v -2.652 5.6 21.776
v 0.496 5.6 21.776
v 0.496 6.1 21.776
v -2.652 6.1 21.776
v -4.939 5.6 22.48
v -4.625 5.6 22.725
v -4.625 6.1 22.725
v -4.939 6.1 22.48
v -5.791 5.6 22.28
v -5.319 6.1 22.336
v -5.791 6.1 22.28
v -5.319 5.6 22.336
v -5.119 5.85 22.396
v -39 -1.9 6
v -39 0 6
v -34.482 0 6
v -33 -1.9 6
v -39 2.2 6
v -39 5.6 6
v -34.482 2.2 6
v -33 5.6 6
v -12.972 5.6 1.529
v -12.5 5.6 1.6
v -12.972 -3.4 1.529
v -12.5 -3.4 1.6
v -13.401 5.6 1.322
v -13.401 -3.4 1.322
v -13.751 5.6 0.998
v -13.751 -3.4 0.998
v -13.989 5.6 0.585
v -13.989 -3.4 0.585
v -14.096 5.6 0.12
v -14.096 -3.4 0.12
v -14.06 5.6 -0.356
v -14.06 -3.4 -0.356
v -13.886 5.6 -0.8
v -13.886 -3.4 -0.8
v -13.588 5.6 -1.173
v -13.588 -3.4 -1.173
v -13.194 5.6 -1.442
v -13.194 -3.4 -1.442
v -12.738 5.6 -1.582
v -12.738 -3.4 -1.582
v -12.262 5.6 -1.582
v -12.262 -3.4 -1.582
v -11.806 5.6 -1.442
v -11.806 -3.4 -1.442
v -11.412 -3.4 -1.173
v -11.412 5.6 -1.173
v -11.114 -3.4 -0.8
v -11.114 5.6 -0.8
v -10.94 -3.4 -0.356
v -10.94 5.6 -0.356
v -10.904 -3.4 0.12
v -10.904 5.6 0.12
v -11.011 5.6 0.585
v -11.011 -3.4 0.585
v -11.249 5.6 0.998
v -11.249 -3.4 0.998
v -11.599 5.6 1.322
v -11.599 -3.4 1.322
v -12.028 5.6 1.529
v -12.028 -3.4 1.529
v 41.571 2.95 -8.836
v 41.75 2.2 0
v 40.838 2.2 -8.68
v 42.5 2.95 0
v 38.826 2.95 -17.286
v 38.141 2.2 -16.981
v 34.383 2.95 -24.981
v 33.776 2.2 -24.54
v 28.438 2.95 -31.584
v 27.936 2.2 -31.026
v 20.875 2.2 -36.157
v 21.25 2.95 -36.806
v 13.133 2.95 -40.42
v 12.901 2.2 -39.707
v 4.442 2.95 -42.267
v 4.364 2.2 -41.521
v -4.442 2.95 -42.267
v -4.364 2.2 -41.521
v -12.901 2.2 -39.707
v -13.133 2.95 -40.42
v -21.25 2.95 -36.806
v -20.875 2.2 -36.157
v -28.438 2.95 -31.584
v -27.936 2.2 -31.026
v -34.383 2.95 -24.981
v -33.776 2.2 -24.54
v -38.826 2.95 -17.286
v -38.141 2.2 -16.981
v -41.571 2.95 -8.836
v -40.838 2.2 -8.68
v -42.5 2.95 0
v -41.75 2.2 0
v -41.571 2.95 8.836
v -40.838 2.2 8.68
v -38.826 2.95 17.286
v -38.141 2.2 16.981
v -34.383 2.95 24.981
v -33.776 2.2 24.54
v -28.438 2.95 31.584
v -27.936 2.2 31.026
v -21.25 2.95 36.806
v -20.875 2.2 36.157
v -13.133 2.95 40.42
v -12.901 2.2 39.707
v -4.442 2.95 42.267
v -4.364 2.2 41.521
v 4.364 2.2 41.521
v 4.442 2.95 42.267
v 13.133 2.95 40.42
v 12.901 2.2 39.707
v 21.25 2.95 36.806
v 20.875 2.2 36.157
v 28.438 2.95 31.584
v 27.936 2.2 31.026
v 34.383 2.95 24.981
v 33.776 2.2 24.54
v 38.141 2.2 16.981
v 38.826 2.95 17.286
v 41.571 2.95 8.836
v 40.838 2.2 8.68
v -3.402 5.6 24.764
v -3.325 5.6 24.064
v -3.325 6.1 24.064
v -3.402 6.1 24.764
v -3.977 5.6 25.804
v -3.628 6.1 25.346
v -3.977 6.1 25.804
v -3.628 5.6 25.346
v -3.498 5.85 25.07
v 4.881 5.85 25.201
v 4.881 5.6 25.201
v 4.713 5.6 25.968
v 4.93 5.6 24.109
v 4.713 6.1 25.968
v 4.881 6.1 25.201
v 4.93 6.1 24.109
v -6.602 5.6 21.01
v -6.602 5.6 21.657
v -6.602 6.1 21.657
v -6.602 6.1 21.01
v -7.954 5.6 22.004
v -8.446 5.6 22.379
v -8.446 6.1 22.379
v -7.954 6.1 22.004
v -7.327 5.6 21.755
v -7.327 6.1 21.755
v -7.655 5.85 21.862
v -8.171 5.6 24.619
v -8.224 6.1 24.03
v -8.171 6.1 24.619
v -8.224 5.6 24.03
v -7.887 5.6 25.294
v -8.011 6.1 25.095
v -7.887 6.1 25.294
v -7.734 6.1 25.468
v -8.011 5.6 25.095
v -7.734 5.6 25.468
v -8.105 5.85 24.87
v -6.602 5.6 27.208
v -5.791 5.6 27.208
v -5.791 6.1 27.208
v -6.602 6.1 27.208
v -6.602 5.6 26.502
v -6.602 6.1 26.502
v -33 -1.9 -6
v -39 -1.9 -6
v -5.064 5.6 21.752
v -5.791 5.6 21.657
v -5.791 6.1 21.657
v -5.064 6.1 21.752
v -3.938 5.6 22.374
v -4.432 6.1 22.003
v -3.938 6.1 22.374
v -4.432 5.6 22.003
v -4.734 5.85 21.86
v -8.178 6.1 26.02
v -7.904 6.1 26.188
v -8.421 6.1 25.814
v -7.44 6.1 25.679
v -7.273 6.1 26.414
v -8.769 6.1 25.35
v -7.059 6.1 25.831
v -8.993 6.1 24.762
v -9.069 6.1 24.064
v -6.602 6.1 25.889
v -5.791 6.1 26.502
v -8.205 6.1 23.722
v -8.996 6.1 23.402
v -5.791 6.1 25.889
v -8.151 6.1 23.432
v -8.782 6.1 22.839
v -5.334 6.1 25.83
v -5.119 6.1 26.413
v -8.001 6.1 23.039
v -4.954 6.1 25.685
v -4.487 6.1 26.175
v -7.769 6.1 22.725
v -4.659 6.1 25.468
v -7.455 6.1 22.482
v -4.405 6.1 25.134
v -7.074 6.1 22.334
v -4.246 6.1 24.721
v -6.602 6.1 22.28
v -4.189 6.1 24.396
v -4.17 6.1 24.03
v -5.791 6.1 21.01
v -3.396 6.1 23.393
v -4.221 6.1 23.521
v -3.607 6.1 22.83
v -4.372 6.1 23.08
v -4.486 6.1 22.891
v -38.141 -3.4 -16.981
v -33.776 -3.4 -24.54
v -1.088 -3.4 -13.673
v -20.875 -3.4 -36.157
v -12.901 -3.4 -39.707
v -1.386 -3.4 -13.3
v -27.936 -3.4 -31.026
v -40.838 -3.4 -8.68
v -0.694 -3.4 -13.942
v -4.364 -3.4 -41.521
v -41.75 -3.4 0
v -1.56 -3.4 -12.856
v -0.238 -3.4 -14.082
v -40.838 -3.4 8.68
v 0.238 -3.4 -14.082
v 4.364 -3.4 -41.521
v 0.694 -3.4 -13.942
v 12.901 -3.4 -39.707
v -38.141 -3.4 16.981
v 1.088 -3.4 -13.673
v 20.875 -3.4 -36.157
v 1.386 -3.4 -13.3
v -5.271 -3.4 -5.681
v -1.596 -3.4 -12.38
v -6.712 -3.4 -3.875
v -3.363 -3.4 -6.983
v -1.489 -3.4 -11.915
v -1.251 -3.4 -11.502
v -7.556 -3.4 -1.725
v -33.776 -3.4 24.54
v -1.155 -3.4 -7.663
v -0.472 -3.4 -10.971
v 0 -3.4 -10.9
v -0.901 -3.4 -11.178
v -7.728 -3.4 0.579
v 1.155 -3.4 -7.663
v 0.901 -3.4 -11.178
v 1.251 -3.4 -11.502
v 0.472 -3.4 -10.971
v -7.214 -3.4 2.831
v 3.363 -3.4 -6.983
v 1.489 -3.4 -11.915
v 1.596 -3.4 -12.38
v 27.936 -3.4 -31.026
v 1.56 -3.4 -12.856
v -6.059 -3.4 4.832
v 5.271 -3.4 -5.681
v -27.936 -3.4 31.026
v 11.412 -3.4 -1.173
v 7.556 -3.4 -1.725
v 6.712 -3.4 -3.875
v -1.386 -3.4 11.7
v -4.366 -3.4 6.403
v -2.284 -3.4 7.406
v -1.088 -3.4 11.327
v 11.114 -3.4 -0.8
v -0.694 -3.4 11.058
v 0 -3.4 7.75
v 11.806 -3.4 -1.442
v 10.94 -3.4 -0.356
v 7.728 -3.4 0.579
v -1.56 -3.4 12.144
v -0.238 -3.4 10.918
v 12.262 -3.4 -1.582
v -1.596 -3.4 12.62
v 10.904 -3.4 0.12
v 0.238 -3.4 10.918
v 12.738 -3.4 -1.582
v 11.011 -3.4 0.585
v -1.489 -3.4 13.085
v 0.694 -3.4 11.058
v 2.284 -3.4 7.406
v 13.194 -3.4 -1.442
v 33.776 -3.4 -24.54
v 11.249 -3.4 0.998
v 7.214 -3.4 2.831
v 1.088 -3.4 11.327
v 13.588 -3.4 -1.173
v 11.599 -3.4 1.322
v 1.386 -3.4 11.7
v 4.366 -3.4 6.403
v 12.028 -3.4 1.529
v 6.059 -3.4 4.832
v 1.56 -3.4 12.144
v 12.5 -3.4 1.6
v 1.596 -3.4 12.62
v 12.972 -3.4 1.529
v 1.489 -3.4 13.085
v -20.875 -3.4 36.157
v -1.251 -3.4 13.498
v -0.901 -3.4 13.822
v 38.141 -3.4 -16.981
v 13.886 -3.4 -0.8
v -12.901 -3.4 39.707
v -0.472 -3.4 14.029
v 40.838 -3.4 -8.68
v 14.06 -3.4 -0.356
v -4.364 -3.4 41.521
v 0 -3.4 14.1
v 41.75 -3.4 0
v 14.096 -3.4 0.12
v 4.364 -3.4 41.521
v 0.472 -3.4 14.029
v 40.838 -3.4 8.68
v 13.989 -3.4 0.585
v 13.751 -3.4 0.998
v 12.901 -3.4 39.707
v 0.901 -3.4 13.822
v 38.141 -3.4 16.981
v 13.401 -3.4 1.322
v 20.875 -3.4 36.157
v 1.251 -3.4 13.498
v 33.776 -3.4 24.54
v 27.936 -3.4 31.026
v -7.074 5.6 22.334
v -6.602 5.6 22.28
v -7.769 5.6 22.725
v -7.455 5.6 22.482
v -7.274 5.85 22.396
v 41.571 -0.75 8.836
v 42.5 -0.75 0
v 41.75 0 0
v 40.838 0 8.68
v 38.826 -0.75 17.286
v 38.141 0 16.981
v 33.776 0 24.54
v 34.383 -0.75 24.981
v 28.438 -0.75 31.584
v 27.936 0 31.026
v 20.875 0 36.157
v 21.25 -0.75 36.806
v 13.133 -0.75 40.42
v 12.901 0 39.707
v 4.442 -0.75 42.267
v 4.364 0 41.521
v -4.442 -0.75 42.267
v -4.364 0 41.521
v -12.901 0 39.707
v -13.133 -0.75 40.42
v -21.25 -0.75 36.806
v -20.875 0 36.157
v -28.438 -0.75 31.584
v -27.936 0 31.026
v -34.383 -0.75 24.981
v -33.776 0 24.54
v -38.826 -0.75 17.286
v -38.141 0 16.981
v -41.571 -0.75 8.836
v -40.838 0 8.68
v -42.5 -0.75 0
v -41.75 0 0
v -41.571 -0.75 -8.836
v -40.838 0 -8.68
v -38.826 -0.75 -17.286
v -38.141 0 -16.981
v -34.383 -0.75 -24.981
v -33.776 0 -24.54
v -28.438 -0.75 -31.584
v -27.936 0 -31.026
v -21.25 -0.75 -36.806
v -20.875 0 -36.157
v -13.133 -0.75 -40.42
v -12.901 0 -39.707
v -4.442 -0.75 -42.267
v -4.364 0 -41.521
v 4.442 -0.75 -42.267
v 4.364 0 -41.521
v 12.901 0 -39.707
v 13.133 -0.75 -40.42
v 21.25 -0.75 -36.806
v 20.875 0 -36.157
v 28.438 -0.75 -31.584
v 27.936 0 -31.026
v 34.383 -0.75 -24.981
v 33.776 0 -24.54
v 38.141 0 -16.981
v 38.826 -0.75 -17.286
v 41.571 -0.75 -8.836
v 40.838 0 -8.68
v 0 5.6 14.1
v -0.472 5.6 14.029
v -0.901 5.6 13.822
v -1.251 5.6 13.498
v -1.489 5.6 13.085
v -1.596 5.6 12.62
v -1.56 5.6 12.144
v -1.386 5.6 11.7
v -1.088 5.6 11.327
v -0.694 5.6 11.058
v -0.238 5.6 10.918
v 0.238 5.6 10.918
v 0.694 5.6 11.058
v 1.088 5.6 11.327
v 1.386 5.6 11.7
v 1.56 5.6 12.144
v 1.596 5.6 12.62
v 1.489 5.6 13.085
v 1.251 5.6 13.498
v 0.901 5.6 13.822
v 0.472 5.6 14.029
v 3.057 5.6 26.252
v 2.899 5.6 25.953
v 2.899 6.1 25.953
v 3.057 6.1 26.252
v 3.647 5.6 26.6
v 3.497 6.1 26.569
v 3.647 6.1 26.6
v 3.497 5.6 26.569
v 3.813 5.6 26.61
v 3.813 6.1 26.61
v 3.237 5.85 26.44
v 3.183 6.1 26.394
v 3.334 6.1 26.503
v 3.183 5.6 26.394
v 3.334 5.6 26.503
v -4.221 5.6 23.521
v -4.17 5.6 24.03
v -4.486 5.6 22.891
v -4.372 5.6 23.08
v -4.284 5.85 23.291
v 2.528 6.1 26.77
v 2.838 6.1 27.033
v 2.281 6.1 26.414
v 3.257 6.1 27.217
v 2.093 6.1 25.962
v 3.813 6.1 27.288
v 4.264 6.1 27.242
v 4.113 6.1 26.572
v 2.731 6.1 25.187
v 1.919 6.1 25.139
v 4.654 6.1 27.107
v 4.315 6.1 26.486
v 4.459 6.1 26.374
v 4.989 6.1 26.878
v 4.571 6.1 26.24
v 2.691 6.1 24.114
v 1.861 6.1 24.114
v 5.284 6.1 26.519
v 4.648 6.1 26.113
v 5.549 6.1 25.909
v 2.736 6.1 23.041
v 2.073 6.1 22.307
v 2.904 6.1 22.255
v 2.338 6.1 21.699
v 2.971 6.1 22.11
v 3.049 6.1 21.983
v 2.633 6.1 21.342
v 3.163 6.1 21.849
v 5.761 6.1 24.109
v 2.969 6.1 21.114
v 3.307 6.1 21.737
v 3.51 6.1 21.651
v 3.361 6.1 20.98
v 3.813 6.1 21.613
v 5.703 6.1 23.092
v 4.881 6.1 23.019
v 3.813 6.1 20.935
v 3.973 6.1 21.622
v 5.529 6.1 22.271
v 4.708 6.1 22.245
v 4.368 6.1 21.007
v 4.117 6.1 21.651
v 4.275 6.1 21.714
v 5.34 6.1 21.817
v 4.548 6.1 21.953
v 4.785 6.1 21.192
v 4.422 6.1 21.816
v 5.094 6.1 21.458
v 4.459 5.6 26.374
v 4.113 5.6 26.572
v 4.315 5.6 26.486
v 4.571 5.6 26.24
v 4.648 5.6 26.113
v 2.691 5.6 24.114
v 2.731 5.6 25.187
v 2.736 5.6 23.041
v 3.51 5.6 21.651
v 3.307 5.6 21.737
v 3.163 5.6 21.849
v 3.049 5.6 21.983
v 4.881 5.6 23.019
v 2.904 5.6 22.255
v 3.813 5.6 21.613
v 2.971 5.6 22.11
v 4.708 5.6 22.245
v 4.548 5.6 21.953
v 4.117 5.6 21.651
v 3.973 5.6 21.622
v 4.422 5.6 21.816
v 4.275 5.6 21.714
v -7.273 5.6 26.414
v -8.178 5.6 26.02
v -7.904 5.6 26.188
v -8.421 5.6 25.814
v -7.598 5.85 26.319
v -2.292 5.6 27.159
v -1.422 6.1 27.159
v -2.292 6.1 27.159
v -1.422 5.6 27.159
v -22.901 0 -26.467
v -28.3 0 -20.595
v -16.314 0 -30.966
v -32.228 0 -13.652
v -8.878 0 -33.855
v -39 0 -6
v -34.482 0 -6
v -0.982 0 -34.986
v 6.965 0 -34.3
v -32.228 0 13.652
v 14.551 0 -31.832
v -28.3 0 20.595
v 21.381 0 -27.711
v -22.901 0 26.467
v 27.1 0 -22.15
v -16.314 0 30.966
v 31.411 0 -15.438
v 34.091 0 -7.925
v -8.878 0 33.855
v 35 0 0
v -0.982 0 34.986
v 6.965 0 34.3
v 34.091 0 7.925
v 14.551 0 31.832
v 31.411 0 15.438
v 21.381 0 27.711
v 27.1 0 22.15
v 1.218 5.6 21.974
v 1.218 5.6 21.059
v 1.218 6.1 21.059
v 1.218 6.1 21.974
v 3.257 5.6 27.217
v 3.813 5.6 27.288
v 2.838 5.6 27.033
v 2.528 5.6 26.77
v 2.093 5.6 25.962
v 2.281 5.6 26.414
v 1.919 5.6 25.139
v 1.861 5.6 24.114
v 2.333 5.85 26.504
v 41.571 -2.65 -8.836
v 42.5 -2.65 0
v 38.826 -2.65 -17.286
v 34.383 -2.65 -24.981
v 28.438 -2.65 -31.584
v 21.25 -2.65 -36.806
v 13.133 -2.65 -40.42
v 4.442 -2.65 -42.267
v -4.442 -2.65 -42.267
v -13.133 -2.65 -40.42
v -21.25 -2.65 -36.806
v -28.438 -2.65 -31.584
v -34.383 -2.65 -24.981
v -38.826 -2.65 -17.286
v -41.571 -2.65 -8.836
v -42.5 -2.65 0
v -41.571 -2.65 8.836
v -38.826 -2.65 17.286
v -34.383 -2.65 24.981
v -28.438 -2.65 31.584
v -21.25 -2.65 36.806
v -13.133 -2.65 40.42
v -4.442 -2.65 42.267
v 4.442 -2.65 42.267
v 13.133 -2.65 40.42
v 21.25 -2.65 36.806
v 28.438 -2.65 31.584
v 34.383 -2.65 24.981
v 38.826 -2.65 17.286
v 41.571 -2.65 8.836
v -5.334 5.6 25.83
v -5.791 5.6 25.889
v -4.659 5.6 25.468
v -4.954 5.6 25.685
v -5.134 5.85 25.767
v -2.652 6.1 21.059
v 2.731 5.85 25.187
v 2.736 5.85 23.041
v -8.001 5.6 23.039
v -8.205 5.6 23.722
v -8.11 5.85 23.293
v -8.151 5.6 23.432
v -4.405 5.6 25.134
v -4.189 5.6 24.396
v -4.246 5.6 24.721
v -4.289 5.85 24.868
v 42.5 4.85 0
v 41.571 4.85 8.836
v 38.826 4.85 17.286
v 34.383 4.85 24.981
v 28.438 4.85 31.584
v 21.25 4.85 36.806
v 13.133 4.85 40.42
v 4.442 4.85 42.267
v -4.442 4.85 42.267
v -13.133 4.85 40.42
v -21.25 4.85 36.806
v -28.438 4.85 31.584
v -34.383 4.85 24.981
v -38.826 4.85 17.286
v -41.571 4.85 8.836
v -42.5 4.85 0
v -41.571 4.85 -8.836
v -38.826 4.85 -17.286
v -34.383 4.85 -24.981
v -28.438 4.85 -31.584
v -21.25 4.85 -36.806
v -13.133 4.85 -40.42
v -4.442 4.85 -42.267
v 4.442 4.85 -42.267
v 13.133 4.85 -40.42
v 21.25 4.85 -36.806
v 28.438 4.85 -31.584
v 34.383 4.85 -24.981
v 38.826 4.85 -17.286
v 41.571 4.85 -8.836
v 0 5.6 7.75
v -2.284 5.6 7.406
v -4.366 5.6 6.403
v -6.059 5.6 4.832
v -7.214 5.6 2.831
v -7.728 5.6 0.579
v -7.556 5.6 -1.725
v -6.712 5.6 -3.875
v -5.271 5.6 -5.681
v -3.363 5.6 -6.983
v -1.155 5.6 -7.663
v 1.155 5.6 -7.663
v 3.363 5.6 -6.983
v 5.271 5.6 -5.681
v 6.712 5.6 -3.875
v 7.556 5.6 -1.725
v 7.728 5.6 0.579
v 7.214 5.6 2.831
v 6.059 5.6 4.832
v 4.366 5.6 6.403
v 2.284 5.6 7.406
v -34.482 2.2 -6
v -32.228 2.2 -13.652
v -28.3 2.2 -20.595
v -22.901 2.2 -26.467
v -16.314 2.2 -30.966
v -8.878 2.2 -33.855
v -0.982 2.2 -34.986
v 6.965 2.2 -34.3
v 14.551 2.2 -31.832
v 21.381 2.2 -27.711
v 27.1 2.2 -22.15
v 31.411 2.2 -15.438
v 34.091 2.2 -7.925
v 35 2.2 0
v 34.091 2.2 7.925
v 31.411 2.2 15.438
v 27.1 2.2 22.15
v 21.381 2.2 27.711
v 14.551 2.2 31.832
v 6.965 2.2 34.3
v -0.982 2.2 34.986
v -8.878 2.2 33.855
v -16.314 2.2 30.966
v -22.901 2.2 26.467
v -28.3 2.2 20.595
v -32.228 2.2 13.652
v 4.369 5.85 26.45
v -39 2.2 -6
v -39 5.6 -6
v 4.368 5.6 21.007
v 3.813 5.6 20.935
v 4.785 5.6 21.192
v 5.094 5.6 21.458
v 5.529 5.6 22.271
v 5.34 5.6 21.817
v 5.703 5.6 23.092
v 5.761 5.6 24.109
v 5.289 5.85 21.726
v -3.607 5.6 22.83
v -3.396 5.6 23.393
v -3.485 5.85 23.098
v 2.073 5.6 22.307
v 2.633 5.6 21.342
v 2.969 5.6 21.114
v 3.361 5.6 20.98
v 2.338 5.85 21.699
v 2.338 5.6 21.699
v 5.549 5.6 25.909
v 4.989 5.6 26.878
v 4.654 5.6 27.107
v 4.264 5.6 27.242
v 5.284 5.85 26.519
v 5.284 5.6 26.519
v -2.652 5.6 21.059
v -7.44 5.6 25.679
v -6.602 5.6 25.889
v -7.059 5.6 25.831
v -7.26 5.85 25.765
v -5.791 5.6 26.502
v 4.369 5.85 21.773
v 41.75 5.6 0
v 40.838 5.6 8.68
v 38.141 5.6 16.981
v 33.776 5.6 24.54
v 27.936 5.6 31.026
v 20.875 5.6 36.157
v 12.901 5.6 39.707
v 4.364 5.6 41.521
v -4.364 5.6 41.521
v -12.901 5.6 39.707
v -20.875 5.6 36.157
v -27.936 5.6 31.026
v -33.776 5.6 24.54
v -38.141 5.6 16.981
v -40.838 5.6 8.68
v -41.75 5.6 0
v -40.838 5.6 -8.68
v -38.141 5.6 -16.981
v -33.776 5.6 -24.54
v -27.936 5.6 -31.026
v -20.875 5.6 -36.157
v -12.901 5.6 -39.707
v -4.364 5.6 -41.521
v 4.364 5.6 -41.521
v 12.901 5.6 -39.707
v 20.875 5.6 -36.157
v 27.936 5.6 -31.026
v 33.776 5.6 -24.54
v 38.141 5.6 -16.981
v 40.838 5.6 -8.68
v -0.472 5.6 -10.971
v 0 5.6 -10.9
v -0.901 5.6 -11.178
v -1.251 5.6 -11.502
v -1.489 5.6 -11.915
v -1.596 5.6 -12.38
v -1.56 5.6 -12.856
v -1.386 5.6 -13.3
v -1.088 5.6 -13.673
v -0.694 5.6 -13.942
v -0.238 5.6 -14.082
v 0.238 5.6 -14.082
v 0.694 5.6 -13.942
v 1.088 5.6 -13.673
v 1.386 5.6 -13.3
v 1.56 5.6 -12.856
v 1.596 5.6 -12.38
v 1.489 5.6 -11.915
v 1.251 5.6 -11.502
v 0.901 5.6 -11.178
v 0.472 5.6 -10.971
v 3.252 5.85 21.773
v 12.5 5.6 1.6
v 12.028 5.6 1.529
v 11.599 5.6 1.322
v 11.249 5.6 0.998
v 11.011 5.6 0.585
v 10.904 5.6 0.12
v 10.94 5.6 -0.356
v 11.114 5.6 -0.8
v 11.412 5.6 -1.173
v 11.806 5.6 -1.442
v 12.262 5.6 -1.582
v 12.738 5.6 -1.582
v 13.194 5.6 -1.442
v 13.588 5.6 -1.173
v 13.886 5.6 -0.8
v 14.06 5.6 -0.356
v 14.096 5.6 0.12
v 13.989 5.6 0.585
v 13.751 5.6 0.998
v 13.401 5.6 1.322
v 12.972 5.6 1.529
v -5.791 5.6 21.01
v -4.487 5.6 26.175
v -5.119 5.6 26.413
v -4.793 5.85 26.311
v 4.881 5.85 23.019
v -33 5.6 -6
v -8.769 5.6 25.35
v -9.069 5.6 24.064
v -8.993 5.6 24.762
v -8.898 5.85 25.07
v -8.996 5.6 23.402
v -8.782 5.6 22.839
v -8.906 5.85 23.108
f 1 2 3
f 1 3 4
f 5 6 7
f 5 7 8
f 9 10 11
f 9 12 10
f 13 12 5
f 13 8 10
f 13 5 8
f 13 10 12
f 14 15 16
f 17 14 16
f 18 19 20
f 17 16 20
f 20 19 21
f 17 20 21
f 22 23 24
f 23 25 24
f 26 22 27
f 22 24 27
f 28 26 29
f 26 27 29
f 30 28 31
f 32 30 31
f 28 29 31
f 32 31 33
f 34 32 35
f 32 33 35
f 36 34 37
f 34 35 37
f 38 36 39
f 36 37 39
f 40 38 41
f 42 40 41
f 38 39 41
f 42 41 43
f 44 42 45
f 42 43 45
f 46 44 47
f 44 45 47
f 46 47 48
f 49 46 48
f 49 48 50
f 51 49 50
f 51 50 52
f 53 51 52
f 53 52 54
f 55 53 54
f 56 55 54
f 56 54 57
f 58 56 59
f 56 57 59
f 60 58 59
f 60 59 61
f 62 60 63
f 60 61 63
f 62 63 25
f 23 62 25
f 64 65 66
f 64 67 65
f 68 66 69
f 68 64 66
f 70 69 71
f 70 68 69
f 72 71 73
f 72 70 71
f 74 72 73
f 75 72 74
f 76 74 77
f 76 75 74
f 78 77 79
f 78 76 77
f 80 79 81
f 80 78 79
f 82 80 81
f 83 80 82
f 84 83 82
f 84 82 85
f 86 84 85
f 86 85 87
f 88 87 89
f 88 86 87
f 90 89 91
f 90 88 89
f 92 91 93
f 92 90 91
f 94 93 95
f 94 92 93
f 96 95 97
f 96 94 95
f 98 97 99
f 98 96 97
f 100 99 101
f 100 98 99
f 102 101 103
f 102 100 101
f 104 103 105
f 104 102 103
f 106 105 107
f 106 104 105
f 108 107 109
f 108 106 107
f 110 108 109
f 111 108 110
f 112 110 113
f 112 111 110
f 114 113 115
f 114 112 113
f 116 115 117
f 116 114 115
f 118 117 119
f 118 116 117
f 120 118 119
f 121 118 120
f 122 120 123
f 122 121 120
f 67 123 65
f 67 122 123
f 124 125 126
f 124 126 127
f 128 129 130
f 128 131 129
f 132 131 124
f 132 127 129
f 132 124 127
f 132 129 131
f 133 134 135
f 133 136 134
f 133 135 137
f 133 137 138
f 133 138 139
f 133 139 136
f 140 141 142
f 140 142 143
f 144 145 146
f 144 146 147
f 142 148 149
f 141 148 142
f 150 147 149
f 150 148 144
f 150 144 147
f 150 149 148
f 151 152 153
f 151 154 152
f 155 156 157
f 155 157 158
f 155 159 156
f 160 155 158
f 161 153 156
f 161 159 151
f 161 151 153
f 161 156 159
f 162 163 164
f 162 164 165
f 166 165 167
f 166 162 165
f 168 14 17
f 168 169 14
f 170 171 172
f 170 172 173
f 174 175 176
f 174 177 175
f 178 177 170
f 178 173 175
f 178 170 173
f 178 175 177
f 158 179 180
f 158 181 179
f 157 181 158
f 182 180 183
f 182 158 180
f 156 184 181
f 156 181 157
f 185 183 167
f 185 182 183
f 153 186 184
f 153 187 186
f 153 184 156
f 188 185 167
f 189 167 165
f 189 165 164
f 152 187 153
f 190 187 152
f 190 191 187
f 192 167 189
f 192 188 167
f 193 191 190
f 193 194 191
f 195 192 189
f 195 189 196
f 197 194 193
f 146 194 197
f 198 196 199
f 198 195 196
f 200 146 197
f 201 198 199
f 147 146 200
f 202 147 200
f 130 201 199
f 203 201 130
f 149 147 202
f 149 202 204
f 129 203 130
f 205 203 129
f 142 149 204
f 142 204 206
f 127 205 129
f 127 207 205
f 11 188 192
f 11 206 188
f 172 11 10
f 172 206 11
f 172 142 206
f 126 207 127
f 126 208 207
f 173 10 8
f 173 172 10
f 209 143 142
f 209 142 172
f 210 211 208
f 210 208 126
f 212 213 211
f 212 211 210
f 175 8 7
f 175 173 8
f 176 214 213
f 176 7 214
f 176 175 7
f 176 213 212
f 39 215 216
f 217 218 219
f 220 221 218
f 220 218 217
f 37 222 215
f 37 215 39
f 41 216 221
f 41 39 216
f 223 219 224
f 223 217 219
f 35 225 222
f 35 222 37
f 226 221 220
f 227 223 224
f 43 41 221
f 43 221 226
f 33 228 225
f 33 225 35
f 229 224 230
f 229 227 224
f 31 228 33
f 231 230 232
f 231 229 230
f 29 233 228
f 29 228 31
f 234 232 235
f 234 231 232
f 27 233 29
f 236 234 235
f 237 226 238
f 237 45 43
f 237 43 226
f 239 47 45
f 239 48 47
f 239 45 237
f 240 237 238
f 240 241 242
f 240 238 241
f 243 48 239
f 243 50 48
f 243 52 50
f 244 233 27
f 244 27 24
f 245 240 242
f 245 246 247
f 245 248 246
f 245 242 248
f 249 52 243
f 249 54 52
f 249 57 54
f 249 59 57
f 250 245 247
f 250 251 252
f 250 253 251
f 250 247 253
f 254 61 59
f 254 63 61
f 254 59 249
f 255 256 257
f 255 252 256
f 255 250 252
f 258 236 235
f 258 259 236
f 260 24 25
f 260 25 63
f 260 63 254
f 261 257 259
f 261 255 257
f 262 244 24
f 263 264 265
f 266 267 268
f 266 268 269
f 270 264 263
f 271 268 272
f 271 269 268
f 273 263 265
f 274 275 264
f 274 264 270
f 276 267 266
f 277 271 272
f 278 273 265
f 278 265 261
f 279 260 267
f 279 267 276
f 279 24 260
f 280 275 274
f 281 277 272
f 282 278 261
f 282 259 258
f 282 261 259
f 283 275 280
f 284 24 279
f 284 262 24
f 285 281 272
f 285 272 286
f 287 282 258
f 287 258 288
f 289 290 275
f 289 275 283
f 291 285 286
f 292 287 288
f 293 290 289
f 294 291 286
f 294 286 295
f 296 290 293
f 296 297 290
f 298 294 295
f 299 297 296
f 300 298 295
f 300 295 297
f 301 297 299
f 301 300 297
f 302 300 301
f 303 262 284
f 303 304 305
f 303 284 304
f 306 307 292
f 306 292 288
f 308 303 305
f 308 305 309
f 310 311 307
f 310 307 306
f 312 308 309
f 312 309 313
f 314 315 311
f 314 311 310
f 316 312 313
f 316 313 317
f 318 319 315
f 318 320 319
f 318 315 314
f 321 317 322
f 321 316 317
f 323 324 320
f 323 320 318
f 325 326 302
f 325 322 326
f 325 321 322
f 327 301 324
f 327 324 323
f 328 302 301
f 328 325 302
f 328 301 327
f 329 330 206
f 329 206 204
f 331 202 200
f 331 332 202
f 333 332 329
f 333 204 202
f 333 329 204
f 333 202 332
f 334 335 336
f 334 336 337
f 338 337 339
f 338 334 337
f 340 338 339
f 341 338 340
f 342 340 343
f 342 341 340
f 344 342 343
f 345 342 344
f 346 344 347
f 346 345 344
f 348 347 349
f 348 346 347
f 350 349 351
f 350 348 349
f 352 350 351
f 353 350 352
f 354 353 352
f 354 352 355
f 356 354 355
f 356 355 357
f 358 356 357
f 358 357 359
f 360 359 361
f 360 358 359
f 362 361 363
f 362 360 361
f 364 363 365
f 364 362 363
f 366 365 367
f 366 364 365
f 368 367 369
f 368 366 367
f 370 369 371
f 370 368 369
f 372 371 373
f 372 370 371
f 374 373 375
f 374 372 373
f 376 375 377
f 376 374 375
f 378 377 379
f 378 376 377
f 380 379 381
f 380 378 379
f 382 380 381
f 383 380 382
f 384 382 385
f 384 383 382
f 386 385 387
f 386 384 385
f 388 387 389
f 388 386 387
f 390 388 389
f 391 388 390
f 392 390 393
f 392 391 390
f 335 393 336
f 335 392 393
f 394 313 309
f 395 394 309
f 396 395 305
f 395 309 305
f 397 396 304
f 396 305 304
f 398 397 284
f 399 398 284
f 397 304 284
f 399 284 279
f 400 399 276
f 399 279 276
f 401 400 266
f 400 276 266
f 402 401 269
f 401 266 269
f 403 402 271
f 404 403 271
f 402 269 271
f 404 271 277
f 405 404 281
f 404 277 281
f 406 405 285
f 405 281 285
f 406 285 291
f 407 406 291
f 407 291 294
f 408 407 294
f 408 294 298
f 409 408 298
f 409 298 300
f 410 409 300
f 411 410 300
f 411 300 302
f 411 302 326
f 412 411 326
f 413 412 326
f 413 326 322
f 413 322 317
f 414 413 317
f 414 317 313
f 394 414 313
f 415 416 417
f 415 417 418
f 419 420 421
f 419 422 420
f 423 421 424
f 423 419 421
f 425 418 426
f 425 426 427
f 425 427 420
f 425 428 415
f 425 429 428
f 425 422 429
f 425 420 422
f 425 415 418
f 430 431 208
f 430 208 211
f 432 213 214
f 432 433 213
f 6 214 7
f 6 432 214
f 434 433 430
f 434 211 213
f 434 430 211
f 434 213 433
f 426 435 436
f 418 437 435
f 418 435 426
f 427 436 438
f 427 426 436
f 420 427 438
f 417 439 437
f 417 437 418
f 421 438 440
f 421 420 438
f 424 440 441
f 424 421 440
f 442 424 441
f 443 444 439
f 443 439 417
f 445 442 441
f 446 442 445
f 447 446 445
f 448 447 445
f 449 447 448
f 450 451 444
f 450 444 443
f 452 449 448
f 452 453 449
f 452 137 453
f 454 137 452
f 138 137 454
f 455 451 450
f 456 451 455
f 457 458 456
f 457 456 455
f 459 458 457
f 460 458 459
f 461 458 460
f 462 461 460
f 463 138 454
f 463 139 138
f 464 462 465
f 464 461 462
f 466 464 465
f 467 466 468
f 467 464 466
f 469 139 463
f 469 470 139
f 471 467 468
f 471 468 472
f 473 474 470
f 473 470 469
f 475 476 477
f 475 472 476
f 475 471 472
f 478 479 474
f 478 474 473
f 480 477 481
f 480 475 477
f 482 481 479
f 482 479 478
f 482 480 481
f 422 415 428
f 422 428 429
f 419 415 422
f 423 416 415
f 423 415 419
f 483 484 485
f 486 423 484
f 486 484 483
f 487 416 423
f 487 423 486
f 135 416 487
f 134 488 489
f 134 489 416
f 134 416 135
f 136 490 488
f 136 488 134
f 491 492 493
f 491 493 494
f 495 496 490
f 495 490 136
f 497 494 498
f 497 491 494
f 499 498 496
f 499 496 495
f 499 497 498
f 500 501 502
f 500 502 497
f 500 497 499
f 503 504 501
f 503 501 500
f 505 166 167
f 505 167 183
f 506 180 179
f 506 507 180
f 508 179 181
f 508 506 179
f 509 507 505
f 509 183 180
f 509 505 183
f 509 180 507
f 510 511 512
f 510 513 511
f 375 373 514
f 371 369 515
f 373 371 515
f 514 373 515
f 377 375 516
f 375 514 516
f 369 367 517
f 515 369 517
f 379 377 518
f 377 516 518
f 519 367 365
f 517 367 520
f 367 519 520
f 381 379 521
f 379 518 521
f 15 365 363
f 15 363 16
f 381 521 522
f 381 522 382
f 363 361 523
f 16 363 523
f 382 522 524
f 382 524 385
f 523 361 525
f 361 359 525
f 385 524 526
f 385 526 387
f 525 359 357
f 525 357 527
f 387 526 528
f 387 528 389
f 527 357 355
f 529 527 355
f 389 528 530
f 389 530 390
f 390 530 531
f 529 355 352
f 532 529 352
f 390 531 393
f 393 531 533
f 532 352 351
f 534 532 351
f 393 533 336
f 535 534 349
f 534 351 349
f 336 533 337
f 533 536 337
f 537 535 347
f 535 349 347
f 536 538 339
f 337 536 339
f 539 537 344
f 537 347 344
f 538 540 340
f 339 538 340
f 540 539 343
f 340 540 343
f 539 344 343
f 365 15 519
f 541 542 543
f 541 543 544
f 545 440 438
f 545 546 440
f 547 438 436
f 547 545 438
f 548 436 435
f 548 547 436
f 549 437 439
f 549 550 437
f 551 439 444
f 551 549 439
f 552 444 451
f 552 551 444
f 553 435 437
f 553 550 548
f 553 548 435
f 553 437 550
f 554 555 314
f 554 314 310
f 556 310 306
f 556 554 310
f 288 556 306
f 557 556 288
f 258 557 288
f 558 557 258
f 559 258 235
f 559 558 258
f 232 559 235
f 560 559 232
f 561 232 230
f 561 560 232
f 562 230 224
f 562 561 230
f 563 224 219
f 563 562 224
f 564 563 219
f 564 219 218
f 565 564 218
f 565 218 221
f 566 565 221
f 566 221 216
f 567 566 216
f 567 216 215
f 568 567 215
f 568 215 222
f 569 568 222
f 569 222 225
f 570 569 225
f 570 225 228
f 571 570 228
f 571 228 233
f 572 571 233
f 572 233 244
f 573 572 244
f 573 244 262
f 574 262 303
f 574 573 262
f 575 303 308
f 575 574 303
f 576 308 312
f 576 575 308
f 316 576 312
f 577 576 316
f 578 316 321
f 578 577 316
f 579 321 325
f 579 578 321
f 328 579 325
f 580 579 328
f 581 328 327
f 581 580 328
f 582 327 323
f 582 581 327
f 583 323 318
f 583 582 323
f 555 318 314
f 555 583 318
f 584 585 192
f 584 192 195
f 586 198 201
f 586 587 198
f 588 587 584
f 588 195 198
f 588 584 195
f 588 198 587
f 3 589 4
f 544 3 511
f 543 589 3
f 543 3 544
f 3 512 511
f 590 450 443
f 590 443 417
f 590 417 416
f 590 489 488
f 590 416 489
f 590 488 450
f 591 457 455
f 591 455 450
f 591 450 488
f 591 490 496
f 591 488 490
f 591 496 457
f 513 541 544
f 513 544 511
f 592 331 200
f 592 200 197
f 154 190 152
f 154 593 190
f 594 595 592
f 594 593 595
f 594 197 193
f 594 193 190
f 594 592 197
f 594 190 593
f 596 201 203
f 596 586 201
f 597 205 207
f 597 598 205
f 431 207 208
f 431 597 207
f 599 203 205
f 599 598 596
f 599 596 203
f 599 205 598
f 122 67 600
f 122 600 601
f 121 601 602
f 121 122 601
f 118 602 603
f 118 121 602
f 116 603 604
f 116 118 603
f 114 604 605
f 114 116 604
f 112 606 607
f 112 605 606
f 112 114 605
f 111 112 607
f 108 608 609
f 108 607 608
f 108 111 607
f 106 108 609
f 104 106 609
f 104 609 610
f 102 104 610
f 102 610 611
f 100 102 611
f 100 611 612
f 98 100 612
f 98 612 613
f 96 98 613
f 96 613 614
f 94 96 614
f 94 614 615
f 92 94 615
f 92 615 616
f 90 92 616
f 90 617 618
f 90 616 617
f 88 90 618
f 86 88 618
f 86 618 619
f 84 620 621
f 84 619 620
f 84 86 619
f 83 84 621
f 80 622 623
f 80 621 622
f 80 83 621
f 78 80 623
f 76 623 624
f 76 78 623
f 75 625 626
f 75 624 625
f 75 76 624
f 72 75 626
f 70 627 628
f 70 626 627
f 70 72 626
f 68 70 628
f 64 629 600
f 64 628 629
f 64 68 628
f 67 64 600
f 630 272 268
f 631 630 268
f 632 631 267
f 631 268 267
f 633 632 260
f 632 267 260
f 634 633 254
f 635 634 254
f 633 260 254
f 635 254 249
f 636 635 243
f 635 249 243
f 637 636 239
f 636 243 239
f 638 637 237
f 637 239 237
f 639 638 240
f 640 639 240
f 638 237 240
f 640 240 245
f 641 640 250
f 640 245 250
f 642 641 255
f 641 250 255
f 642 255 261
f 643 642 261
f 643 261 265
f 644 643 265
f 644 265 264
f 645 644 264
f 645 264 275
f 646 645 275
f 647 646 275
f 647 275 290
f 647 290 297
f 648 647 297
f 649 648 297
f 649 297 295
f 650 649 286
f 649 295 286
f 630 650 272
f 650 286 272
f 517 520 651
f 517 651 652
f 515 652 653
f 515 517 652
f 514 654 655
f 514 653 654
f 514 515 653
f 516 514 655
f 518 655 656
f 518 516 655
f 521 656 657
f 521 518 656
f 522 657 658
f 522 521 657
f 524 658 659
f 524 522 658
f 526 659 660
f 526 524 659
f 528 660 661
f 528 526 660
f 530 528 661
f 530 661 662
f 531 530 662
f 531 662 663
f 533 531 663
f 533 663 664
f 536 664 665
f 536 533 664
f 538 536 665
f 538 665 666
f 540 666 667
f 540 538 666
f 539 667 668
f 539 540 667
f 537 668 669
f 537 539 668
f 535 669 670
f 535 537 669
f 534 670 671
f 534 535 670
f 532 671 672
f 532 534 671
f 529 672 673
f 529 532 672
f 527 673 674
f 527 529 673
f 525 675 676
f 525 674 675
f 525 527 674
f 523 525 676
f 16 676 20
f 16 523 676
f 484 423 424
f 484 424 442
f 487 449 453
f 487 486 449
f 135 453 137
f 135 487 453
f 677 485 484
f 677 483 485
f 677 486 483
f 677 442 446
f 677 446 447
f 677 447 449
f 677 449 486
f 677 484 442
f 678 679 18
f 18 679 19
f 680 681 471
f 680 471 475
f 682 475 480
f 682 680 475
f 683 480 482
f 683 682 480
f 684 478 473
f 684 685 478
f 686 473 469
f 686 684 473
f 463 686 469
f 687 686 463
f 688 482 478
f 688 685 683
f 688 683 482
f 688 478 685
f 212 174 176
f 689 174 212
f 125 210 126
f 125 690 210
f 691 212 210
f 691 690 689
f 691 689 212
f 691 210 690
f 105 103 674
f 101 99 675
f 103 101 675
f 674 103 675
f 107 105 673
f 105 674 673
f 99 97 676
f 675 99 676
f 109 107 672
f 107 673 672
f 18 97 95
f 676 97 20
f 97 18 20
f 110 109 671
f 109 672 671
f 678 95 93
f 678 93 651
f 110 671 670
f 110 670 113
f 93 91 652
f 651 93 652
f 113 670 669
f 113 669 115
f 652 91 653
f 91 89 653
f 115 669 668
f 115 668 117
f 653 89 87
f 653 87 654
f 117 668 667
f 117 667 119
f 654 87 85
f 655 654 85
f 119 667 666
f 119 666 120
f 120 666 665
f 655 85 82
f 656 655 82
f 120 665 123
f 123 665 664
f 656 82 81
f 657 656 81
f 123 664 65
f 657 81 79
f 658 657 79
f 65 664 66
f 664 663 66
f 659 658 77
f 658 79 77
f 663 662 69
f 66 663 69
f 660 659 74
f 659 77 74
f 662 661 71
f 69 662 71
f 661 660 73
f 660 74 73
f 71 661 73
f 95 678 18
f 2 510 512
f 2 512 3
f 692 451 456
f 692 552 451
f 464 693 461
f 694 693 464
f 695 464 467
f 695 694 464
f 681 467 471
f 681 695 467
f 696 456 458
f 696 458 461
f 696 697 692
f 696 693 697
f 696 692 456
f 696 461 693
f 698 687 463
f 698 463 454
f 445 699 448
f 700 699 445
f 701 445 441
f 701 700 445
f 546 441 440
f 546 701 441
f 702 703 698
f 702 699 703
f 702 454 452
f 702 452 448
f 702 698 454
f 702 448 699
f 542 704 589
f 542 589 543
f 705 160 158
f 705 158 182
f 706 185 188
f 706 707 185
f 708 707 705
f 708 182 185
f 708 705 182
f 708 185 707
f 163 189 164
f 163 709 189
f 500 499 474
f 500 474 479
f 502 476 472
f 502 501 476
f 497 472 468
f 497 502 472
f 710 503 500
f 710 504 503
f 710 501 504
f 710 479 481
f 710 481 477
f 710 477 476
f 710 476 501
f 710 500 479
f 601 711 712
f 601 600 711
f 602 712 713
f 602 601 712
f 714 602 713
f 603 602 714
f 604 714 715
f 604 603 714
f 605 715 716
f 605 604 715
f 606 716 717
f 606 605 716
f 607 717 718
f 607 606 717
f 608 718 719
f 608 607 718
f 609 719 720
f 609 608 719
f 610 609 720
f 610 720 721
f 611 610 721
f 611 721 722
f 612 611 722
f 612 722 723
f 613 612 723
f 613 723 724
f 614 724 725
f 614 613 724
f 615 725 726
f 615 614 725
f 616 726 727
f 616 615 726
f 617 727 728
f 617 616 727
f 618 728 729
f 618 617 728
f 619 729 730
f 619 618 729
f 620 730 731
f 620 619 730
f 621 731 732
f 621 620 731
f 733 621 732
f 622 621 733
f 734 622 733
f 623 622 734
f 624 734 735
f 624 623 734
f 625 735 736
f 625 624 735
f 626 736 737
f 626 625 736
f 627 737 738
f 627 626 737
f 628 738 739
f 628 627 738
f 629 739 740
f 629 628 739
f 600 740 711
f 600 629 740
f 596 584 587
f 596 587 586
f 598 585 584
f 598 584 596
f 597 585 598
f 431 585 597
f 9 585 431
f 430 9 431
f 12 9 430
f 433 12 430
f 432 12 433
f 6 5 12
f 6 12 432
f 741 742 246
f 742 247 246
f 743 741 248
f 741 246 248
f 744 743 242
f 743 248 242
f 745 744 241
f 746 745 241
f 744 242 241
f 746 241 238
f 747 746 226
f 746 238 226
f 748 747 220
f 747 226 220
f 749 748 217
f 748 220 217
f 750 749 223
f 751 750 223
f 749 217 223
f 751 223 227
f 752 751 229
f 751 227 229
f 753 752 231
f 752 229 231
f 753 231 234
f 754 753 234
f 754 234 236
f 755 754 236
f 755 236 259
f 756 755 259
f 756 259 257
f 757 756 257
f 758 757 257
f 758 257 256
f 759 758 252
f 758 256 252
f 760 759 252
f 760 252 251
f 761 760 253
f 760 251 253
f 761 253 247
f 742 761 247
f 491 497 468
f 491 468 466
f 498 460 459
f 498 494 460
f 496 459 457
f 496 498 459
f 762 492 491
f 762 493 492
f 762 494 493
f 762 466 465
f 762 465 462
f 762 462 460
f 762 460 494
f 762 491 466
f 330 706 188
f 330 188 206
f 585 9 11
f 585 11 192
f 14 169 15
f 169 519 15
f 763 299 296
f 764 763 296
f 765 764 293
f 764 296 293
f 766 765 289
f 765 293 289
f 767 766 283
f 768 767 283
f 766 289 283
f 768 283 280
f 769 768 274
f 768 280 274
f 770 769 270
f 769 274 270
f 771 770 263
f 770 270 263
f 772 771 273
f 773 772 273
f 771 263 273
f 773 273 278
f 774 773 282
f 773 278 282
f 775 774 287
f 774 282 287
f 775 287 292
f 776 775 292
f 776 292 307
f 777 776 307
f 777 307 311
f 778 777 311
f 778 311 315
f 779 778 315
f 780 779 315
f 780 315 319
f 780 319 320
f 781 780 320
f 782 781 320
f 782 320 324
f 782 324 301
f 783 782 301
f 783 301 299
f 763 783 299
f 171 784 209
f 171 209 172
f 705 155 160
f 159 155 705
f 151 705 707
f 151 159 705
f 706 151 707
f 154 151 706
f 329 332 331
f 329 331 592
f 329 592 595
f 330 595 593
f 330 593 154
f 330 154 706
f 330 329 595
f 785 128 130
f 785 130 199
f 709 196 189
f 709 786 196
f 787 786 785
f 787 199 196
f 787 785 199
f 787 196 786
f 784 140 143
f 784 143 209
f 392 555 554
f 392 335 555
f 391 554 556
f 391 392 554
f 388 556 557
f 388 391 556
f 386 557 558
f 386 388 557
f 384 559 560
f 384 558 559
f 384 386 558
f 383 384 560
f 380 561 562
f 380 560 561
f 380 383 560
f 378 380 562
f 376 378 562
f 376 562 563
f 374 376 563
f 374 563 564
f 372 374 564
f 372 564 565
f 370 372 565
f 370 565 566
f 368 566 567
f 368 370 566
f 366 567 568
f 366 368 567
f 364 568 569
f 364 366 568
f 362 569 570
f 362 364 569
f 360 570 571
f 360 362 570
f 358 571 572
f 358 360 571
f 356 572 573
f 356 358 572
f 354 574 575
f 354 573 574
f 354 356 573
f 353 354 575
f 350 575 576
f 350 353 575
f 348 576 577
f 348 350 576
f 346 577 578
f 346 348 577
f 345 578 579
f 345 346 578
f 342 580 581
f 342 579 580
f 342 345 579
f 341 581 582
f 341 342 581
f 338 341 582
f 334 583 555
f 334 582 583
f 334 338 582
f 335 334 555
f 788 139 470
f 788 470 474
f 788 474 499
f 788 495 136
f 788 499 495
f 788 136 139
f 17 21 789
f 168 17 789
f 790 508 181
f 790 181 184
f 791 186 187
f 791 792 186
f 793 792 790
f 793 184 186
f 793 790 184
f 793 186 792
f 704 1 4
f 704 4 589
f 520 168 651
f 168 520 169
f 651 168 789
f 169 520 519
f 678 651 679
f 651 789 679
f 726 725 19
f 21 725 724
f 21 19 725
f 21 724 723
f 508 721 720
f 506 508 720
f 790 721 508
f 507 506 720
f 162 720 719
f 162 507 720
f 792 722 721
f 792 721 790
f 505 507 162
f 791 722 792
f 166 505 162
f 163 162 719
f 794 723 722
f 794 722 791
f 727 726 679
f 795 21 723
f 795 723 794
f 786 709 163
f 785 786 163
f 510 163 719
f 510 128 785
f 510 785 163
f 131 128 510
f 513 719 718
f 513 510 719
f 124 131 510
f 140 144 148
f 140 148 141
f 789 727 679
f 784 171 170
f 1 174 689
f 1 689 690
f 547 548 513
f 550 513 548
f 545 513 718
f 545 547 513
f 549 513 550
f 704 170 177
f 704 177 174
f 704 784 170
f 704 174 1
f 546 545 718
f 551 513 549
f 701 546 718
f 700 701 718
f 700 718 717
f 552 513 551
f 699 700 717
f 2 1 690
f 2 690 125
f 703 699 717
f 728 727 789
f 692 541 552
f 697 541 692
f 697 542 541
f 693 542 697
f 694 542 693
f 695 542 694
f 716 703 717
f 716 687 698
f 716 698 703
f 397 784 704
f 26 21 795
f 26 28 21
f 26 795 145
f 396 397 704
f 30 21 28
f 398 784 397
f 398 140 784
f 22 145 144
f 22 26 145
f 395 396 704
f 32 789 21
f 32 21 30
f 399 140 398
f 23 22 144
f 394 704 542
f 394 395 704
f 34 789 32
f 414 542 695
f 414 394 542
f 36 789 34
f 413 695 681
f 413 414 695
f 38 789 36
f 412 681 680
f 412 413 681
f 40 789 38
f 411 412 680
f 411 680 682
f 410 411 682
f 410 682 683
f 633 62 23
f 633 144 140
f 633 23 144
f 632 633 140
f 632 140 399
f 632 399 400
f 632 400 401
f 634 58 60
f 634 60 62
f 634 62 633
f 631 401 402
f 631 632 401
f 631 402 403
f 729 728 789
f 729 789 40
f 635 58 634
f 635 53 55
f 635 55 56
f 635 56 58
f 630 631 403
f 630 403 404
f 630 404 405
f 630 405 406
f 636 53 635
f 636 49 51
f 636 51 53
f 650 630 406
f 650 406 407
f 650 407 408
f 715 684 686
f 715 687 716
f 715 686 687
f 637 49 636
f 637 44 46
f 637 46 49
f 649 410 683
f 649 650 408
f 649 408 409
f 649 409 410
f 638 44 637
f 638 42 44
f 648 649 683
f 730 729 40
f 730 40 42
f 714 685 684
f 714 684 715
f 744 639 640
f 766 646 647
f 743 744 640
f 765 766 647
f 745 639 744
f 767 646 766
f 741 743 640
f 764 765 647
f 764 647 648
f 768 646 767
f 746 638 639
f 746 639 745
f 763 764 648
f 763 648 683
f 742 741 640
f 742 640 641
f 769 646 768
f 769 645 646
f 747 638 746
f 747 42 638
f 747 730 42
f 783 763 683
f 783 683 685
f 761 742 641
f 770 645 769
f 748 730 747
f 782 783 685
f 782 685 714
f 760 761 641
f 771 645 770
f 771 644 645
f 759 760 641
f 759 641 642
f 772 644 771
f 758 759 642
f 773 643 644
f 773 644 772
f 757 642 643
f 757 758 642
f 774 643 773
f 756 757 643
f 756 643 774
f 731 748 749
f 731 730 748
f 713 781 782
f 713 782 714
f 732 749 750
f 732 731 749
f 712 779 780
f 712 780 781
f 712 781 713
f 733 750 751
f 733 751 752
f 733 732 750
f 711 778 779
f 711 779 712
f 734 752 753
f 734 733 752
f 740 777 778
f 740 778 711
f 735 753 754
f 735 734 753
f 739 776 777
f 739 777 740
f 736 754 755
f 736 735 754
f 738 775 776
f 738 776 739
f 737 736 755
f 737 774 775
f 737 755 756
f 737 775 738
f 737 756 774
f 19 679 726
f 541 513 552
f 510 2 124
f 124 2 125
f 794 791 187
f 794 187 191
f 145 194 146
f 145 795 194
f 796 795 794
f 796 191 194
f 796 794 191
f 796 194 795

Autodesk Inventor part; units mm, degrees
ref_plane "YZ Plane" through (0, 0, 0) normal (1, 0, 0) x (0, 1, 0)
ref_plane "XZ Plane" through (0, 0, 0) normal (0, 1, 0) x (-1, 0, 0)
ref_plane "XY Plane" through (0, 0, 0) normal (0, 0, 1) x (1, 0, 0)
sketch "スケッチ1" plane through (0, 0, 0) normal (0, 1, 0) x (-1, 0, 0)
  circle A0 centre (0, 0) radius 35
  dimension "d0" = 70
extrude "押し出し1" add sketch "スケッチ1" along normal blind 2.2
sketch "スケッチ2" plane through (0, 2.2, 0) normal (0, 1, 0) x (1, 0, 0)
  circle A0 centre (0, 0) radius 42.5
  line L0 (-3.2969, -22.0057) -> (4.4145, -22.0057) construction
  line L1 (4.4145, -22.0057) -> (4.4145, -25.1797) construction
  line L2 (4.4145, -25.1797) -> (-3.2969, -25.1797) construction
  line L3 (-3.2969, -25.1797) -> (-3.2969, -22.0057) construction
  dimension "d3" = 85
extrude "押し出し2" add sketch "スケッチ2" along normal blind 3.4
chamfer "面取り1" distance 0.75 angle 45 1 edges at (-42.5, 2.2, 0)
chamfer "面取り2" distance 0.75 angle 45 1 edges at (-42.5, 5.6, 0)
sketch "スケッチ3" plane through (0, 0, 0) normal (0, -1, 0) x (1, 0, 0)
  circle A0 centre (0, 0) radius 42.5
  dimension "d12" = 85
extrude "押し出し3" add sketch "スケッチ3" along normal blind 3.4
chamfer "面取り3" distance 0.75 angle 45 1 edges at (-42.5, 0, 0)
chamfer "面取り4" distance 0.75 angle 45 1 edges at (-42.5, -3.4, 0)
sketch "スケッチ6" plane through (0, 5.6, 0) normal (0, 1, 0) x (1, 0, 0)
  circle A0 centre (0, 0) radius 7.65
  line L0 (0, 7.65) -> (46.8799, 7.65)
  circle A1 centre (0, 0) radius 47.5 projected
  line L1 (0, -7.65) -> (46.8799, -7.65)
  dimension "d39" = 15.3
extrude "押し出し5" [suppressed]
chamfer "面取り7" [suppressed]
chamfer "面取り8" [suppressed]
chamfer "面取り9" [suppressed]
sketch "スケッチ7" plane through (0, 5.6, 0) normal (0, 1, 0) x (1, 0, 0)
  line L0 (-9.3358, -20.9354) -> (21.308, -20.9354) construction
  line L1 (21.308, -20.9354) -> (21.308, -27.5341) construction
  line L2 (21.308, -27.5341) -> (-9.3358, -27.5341) construction
  line L3 (-9.3358, -27.5341) -> (-9.3358, -20.9354) construction
  spline S0 degree 2 poles (-5.7914, -21.6571) (-5.2131, -21.667) (-4.2541, -22.0526) (-3.9377, -22.3739) knots 0 0 0 1 2 2 2
  spline S1 degree 2 poles (-3.9377, -22.3739) (-3.646, -22.6754) (-3.3247, -23.5207) (-3.3247, -24.0645) knots 0 0 0 1 2 2 2
  spline S2 degree 2 poles (-3.3247, -24.0645) (-3.3247, -24.633) (-3.6708, -25.5079) (-3.9772, -25.8045) knots 0 0 0 1 2 2 2
  spline S3 degree 2 poles (-3.9772, -25.8045) (-4.3084, -26.1308) (-5.2773, -26.4916) (-5.7914, -26.5015) knots 0 0 0 1 2 2 2
  line L4 (-5.7914, -26.5015) -> (-5.7914, -27.2084)
  line L5 (-5.7914, -27.2084) -> (-6.6021, -27.2084)
  line L6 (-6.6021, -27.2084) -> (-6.6021, -26.5015)
  spline S4 degree 2 poles (-6.6021, -26.5015) (-7.1162, -26.4867) (-8.0802, -26.1506) (-8.4213, -25.8144) knots 0 0 0 1 2 2 2
  spline S5 degree 2 poles (-8.4213, -25.8144) (-8.7277, -25.5129) (-9.0688, -24.628) (-9.0688, -24.0645) knots 0 0 0 1 2 2 2
  spline S6 degree 2 poles (-9.0688, -24.0645) (-9.0688, -23.5306) (-8.7426, -22.6853) (-8.446, -22.3788) knots 0 0 0 1 2 2 2
  spline S7 degree 2 poles (-8.446, -22.3788) (-8.1296, -22.0526) (-7.1805, -21.672) (-6.6021, -21.6571) knots 0 0 0 1 2 2 2
  line L7 (-6.6021, -21.6571) -> (-6.6021, -21.0096)
  line L8 (-6.6021, -21.0096) -> (-5.7914, -21.0096)
  line L9 (-5.7914, -21.0096) -> (-5.7914, -21.6571)
  spline S8 degree 2 poles (-5.7914, -25.8886) (-5.4207, -25.8787) (-4.8473, -25.6562) (-4.6594, -25.4684) knots 0 0 0 1 2 2 2
  spline S9 degree 2 poles (-4.6594, -25.4684) (-4.4073, -25.2212) (-4.17, -24.5143) (-4.17, -24.0299) knots 0 0 0 1 2 2 2
  spline S10 degree 2 poles (-4.17, -24.0299) (-4.17, -23.6245) (-4.3974, -22.9572) (-4.6248, -22.7249) knots 0 0 0 1 2 2 2
  spline S11 degree 2 poles (-4.6248, -22.7249) (-4.8374, -22.5024) (-5.4009, -22.2899) (-5.7914, -22.28) knots 0 0 0 1 2 2 2
  line L10 (-5.7914, -22.28) -> (-5.7914, -25.8886)
  spline S12 degree 2 poles (-6.6021, -22.28) (-6.9926, -22.2849) (-7.5562, -22.5074) (-7.7687, -22.7249) knots 0 0 0 1 2 2 2
  spline S13 degree 2 poles (-7.7687, -22.7249) (-7.9961, -22.9523) (-8.2235, -23.6344) (-8.2235, -24.0299) knots 0 0 0 1 2 2 2
  spline S14 degree 2 poles (-8.2235, -24.0299) (-8.2235, -24.5143) (-7.9862, -25.2262) (-7.7341, -25.4684) knots 0 0 0 1 2 2 2
  spline S15 degree 2 poles (-7.7341, -25.4684) (-7.5463, -25.6463) (-6.9729, -25.8836) (-6.6021, -25.8886) knots 0 0 0 1 2 2 2
  line L11 (-6.6021, -25.8886) -> (-6.6021, -22.28)
  line L12 (1.2181, -21.9735) -> (-1.4216, -27.159)
  line L13 (-1.4216, -27.159) -> (-2.2916, -27.159)
  line L14 (-2.2916, -27.159) -> (0.4964, -21.7758)
  line L15 (0.4964, -21.7758) -> (-2.6525, -21.7758)
  line L16 (-2.6525, -21.7758) -> (-2.6525, -21.059)
  line L17 (-2.6525, -21.059) -> (1.2181, -21.059)
  line L18 (1.2181, -21.059) -> (1.2181, -21.9735)
  spline S16 degree 2 poles (5.761, -24.109) (5.761, -25.7502) (4.8069, -27.2875) (3.8134, -27.2875) knots 0 0 0 1 2 2 2
  spline S17 degree 2 poles (3.8134, -27.2875) (2.8049, -27.2875) (1.8608, -25.7205) (1.8608, -24.1139) knots 0 0 0 1 2 2 2
  spline S18 degree 2 poles (1.8608, -24.1139) (1.8608, -22.4629) (2.8148, -20.9354) (3.8134, -20.9354) knots 0 0 0 1 2 2 2
  spline S19 degree 2 poles (3.8134, -20.9354) (4.8168, -20.9354) (5.761, -22.5173) (5.761, -24.109) knots 0 0 0 1 2 2 2
  spline S20 degree 2 poles (4.713, -25.9677) (4.8317, -25.6661) (4.9305, -24.7368) (4.9305, -24.109) knots 0 0 0 1 2 2 2
  spline S21 degree 2 poles (4.9305, -24.109) (4.9305, -23.4812) (4.8317, -22.5568) (4.7081, -22.2454) knots 0 0 0 1 2 2 2
  spline S22 degree 2 poles (4.7081, -22.2454) (4.5845, -21.9339) (4.1544, -21.6126) (3.8134, -21.6126) knots 0 0 0 1 2 2 2
  spline S23 degree 2 poles (3.8134, -21.6126) (3.4723, -21.6126) (3.0323, -21.9339) (2.9038, -22.2553) knots 0 0 0 1 2 2 2
  spline S24 degree 2 poles (2.9038, -22.2553) (2.7802, -22.5667) (2.6912, -23.5158) (2.6912, -24.1139) knots 0 0 0 1 2 2 2
  spline S25 degree 2 poles (2.6912, -24.1139) (2.6912, -24.7566) (2.7703, -25.6167) (2.8988, -25.9528) knots 0 0 0 1 2 2 2
  spline S26 degree 2 poles (2.8988, -25.9528) (3.0175, -26.2692) (3.4574, -26.6103) (3.8134, -26.6103) knots 0 0 0 1 2 2 2
  spline S27 degree 2 poles (3.8134, -26.6103) (4.1495, -26.6103) (4.5894, -26.289) (4.713, -25.9677) knots 0 0 0 1 2 2 2
  point P0 (0, 0)
extrude "押し出し6" add sketch "スケッチ7" along normal blind 0.5
sketch "スケッチ8" plane through (0, 5.6, 0) normal (0, 1, 0) x (1, 0, 0)
  line L0 (-33, 6) -> (-39, 6)
  line L1 (-39, 6) -> (-39, -6)
  line L2 (-39, -6) -> (-33, -6)
  line L3 (-33, -6) -> (-33, 6)
  arc A0 (-35, 0) -> (-35, 0) centre (0, 0) ccw projected
  point P0 (-36, -6)
  point P1 (-36, 6)
  dimension "d53" = 12
  dimension "d54" = 6
  dimension "d55" = 33
extrude "押し出し7" cut sketch "スケッチ8" against normal blind 7.5 contours L3 L2 A0 L0 | A0 L2 L1 L0 picked at (-33.6474, -0.6696)
sketch "スケッチ9" plane through (0, 5.6, 0) normal (0, 1, 0) x (1, 0, 0)
  point P0 (0, 0)
  point P1 (0, 0)
hole "穴2" at (0, 5.6, 0) direction (0, -1, 0) diameter 15.5 end through all
sketch "スケッチ10" plane through (0, 5.6, 0) normal (0, 1, 0) x (1, 0, 0)
  circle A0 centre (0, 0) radius 12.5 construction
  point P0 (0, -12.5)
  point P1 (12.5, 0)
  point P2 (0, 12.5)
  point P3 (-12.5, 0)
  dimension "d67" = 25
  dimension "d81" = 360
hole "穴3" at (0, 5.6, 12.5) at (-12.5, 5.6, 0) at (0, 5.6, -12.5) at (12.5, 5.6, 0) direction (0, -1, 0) diameter 3.2 end through all
properties part number "pully_shoulder2_70"
